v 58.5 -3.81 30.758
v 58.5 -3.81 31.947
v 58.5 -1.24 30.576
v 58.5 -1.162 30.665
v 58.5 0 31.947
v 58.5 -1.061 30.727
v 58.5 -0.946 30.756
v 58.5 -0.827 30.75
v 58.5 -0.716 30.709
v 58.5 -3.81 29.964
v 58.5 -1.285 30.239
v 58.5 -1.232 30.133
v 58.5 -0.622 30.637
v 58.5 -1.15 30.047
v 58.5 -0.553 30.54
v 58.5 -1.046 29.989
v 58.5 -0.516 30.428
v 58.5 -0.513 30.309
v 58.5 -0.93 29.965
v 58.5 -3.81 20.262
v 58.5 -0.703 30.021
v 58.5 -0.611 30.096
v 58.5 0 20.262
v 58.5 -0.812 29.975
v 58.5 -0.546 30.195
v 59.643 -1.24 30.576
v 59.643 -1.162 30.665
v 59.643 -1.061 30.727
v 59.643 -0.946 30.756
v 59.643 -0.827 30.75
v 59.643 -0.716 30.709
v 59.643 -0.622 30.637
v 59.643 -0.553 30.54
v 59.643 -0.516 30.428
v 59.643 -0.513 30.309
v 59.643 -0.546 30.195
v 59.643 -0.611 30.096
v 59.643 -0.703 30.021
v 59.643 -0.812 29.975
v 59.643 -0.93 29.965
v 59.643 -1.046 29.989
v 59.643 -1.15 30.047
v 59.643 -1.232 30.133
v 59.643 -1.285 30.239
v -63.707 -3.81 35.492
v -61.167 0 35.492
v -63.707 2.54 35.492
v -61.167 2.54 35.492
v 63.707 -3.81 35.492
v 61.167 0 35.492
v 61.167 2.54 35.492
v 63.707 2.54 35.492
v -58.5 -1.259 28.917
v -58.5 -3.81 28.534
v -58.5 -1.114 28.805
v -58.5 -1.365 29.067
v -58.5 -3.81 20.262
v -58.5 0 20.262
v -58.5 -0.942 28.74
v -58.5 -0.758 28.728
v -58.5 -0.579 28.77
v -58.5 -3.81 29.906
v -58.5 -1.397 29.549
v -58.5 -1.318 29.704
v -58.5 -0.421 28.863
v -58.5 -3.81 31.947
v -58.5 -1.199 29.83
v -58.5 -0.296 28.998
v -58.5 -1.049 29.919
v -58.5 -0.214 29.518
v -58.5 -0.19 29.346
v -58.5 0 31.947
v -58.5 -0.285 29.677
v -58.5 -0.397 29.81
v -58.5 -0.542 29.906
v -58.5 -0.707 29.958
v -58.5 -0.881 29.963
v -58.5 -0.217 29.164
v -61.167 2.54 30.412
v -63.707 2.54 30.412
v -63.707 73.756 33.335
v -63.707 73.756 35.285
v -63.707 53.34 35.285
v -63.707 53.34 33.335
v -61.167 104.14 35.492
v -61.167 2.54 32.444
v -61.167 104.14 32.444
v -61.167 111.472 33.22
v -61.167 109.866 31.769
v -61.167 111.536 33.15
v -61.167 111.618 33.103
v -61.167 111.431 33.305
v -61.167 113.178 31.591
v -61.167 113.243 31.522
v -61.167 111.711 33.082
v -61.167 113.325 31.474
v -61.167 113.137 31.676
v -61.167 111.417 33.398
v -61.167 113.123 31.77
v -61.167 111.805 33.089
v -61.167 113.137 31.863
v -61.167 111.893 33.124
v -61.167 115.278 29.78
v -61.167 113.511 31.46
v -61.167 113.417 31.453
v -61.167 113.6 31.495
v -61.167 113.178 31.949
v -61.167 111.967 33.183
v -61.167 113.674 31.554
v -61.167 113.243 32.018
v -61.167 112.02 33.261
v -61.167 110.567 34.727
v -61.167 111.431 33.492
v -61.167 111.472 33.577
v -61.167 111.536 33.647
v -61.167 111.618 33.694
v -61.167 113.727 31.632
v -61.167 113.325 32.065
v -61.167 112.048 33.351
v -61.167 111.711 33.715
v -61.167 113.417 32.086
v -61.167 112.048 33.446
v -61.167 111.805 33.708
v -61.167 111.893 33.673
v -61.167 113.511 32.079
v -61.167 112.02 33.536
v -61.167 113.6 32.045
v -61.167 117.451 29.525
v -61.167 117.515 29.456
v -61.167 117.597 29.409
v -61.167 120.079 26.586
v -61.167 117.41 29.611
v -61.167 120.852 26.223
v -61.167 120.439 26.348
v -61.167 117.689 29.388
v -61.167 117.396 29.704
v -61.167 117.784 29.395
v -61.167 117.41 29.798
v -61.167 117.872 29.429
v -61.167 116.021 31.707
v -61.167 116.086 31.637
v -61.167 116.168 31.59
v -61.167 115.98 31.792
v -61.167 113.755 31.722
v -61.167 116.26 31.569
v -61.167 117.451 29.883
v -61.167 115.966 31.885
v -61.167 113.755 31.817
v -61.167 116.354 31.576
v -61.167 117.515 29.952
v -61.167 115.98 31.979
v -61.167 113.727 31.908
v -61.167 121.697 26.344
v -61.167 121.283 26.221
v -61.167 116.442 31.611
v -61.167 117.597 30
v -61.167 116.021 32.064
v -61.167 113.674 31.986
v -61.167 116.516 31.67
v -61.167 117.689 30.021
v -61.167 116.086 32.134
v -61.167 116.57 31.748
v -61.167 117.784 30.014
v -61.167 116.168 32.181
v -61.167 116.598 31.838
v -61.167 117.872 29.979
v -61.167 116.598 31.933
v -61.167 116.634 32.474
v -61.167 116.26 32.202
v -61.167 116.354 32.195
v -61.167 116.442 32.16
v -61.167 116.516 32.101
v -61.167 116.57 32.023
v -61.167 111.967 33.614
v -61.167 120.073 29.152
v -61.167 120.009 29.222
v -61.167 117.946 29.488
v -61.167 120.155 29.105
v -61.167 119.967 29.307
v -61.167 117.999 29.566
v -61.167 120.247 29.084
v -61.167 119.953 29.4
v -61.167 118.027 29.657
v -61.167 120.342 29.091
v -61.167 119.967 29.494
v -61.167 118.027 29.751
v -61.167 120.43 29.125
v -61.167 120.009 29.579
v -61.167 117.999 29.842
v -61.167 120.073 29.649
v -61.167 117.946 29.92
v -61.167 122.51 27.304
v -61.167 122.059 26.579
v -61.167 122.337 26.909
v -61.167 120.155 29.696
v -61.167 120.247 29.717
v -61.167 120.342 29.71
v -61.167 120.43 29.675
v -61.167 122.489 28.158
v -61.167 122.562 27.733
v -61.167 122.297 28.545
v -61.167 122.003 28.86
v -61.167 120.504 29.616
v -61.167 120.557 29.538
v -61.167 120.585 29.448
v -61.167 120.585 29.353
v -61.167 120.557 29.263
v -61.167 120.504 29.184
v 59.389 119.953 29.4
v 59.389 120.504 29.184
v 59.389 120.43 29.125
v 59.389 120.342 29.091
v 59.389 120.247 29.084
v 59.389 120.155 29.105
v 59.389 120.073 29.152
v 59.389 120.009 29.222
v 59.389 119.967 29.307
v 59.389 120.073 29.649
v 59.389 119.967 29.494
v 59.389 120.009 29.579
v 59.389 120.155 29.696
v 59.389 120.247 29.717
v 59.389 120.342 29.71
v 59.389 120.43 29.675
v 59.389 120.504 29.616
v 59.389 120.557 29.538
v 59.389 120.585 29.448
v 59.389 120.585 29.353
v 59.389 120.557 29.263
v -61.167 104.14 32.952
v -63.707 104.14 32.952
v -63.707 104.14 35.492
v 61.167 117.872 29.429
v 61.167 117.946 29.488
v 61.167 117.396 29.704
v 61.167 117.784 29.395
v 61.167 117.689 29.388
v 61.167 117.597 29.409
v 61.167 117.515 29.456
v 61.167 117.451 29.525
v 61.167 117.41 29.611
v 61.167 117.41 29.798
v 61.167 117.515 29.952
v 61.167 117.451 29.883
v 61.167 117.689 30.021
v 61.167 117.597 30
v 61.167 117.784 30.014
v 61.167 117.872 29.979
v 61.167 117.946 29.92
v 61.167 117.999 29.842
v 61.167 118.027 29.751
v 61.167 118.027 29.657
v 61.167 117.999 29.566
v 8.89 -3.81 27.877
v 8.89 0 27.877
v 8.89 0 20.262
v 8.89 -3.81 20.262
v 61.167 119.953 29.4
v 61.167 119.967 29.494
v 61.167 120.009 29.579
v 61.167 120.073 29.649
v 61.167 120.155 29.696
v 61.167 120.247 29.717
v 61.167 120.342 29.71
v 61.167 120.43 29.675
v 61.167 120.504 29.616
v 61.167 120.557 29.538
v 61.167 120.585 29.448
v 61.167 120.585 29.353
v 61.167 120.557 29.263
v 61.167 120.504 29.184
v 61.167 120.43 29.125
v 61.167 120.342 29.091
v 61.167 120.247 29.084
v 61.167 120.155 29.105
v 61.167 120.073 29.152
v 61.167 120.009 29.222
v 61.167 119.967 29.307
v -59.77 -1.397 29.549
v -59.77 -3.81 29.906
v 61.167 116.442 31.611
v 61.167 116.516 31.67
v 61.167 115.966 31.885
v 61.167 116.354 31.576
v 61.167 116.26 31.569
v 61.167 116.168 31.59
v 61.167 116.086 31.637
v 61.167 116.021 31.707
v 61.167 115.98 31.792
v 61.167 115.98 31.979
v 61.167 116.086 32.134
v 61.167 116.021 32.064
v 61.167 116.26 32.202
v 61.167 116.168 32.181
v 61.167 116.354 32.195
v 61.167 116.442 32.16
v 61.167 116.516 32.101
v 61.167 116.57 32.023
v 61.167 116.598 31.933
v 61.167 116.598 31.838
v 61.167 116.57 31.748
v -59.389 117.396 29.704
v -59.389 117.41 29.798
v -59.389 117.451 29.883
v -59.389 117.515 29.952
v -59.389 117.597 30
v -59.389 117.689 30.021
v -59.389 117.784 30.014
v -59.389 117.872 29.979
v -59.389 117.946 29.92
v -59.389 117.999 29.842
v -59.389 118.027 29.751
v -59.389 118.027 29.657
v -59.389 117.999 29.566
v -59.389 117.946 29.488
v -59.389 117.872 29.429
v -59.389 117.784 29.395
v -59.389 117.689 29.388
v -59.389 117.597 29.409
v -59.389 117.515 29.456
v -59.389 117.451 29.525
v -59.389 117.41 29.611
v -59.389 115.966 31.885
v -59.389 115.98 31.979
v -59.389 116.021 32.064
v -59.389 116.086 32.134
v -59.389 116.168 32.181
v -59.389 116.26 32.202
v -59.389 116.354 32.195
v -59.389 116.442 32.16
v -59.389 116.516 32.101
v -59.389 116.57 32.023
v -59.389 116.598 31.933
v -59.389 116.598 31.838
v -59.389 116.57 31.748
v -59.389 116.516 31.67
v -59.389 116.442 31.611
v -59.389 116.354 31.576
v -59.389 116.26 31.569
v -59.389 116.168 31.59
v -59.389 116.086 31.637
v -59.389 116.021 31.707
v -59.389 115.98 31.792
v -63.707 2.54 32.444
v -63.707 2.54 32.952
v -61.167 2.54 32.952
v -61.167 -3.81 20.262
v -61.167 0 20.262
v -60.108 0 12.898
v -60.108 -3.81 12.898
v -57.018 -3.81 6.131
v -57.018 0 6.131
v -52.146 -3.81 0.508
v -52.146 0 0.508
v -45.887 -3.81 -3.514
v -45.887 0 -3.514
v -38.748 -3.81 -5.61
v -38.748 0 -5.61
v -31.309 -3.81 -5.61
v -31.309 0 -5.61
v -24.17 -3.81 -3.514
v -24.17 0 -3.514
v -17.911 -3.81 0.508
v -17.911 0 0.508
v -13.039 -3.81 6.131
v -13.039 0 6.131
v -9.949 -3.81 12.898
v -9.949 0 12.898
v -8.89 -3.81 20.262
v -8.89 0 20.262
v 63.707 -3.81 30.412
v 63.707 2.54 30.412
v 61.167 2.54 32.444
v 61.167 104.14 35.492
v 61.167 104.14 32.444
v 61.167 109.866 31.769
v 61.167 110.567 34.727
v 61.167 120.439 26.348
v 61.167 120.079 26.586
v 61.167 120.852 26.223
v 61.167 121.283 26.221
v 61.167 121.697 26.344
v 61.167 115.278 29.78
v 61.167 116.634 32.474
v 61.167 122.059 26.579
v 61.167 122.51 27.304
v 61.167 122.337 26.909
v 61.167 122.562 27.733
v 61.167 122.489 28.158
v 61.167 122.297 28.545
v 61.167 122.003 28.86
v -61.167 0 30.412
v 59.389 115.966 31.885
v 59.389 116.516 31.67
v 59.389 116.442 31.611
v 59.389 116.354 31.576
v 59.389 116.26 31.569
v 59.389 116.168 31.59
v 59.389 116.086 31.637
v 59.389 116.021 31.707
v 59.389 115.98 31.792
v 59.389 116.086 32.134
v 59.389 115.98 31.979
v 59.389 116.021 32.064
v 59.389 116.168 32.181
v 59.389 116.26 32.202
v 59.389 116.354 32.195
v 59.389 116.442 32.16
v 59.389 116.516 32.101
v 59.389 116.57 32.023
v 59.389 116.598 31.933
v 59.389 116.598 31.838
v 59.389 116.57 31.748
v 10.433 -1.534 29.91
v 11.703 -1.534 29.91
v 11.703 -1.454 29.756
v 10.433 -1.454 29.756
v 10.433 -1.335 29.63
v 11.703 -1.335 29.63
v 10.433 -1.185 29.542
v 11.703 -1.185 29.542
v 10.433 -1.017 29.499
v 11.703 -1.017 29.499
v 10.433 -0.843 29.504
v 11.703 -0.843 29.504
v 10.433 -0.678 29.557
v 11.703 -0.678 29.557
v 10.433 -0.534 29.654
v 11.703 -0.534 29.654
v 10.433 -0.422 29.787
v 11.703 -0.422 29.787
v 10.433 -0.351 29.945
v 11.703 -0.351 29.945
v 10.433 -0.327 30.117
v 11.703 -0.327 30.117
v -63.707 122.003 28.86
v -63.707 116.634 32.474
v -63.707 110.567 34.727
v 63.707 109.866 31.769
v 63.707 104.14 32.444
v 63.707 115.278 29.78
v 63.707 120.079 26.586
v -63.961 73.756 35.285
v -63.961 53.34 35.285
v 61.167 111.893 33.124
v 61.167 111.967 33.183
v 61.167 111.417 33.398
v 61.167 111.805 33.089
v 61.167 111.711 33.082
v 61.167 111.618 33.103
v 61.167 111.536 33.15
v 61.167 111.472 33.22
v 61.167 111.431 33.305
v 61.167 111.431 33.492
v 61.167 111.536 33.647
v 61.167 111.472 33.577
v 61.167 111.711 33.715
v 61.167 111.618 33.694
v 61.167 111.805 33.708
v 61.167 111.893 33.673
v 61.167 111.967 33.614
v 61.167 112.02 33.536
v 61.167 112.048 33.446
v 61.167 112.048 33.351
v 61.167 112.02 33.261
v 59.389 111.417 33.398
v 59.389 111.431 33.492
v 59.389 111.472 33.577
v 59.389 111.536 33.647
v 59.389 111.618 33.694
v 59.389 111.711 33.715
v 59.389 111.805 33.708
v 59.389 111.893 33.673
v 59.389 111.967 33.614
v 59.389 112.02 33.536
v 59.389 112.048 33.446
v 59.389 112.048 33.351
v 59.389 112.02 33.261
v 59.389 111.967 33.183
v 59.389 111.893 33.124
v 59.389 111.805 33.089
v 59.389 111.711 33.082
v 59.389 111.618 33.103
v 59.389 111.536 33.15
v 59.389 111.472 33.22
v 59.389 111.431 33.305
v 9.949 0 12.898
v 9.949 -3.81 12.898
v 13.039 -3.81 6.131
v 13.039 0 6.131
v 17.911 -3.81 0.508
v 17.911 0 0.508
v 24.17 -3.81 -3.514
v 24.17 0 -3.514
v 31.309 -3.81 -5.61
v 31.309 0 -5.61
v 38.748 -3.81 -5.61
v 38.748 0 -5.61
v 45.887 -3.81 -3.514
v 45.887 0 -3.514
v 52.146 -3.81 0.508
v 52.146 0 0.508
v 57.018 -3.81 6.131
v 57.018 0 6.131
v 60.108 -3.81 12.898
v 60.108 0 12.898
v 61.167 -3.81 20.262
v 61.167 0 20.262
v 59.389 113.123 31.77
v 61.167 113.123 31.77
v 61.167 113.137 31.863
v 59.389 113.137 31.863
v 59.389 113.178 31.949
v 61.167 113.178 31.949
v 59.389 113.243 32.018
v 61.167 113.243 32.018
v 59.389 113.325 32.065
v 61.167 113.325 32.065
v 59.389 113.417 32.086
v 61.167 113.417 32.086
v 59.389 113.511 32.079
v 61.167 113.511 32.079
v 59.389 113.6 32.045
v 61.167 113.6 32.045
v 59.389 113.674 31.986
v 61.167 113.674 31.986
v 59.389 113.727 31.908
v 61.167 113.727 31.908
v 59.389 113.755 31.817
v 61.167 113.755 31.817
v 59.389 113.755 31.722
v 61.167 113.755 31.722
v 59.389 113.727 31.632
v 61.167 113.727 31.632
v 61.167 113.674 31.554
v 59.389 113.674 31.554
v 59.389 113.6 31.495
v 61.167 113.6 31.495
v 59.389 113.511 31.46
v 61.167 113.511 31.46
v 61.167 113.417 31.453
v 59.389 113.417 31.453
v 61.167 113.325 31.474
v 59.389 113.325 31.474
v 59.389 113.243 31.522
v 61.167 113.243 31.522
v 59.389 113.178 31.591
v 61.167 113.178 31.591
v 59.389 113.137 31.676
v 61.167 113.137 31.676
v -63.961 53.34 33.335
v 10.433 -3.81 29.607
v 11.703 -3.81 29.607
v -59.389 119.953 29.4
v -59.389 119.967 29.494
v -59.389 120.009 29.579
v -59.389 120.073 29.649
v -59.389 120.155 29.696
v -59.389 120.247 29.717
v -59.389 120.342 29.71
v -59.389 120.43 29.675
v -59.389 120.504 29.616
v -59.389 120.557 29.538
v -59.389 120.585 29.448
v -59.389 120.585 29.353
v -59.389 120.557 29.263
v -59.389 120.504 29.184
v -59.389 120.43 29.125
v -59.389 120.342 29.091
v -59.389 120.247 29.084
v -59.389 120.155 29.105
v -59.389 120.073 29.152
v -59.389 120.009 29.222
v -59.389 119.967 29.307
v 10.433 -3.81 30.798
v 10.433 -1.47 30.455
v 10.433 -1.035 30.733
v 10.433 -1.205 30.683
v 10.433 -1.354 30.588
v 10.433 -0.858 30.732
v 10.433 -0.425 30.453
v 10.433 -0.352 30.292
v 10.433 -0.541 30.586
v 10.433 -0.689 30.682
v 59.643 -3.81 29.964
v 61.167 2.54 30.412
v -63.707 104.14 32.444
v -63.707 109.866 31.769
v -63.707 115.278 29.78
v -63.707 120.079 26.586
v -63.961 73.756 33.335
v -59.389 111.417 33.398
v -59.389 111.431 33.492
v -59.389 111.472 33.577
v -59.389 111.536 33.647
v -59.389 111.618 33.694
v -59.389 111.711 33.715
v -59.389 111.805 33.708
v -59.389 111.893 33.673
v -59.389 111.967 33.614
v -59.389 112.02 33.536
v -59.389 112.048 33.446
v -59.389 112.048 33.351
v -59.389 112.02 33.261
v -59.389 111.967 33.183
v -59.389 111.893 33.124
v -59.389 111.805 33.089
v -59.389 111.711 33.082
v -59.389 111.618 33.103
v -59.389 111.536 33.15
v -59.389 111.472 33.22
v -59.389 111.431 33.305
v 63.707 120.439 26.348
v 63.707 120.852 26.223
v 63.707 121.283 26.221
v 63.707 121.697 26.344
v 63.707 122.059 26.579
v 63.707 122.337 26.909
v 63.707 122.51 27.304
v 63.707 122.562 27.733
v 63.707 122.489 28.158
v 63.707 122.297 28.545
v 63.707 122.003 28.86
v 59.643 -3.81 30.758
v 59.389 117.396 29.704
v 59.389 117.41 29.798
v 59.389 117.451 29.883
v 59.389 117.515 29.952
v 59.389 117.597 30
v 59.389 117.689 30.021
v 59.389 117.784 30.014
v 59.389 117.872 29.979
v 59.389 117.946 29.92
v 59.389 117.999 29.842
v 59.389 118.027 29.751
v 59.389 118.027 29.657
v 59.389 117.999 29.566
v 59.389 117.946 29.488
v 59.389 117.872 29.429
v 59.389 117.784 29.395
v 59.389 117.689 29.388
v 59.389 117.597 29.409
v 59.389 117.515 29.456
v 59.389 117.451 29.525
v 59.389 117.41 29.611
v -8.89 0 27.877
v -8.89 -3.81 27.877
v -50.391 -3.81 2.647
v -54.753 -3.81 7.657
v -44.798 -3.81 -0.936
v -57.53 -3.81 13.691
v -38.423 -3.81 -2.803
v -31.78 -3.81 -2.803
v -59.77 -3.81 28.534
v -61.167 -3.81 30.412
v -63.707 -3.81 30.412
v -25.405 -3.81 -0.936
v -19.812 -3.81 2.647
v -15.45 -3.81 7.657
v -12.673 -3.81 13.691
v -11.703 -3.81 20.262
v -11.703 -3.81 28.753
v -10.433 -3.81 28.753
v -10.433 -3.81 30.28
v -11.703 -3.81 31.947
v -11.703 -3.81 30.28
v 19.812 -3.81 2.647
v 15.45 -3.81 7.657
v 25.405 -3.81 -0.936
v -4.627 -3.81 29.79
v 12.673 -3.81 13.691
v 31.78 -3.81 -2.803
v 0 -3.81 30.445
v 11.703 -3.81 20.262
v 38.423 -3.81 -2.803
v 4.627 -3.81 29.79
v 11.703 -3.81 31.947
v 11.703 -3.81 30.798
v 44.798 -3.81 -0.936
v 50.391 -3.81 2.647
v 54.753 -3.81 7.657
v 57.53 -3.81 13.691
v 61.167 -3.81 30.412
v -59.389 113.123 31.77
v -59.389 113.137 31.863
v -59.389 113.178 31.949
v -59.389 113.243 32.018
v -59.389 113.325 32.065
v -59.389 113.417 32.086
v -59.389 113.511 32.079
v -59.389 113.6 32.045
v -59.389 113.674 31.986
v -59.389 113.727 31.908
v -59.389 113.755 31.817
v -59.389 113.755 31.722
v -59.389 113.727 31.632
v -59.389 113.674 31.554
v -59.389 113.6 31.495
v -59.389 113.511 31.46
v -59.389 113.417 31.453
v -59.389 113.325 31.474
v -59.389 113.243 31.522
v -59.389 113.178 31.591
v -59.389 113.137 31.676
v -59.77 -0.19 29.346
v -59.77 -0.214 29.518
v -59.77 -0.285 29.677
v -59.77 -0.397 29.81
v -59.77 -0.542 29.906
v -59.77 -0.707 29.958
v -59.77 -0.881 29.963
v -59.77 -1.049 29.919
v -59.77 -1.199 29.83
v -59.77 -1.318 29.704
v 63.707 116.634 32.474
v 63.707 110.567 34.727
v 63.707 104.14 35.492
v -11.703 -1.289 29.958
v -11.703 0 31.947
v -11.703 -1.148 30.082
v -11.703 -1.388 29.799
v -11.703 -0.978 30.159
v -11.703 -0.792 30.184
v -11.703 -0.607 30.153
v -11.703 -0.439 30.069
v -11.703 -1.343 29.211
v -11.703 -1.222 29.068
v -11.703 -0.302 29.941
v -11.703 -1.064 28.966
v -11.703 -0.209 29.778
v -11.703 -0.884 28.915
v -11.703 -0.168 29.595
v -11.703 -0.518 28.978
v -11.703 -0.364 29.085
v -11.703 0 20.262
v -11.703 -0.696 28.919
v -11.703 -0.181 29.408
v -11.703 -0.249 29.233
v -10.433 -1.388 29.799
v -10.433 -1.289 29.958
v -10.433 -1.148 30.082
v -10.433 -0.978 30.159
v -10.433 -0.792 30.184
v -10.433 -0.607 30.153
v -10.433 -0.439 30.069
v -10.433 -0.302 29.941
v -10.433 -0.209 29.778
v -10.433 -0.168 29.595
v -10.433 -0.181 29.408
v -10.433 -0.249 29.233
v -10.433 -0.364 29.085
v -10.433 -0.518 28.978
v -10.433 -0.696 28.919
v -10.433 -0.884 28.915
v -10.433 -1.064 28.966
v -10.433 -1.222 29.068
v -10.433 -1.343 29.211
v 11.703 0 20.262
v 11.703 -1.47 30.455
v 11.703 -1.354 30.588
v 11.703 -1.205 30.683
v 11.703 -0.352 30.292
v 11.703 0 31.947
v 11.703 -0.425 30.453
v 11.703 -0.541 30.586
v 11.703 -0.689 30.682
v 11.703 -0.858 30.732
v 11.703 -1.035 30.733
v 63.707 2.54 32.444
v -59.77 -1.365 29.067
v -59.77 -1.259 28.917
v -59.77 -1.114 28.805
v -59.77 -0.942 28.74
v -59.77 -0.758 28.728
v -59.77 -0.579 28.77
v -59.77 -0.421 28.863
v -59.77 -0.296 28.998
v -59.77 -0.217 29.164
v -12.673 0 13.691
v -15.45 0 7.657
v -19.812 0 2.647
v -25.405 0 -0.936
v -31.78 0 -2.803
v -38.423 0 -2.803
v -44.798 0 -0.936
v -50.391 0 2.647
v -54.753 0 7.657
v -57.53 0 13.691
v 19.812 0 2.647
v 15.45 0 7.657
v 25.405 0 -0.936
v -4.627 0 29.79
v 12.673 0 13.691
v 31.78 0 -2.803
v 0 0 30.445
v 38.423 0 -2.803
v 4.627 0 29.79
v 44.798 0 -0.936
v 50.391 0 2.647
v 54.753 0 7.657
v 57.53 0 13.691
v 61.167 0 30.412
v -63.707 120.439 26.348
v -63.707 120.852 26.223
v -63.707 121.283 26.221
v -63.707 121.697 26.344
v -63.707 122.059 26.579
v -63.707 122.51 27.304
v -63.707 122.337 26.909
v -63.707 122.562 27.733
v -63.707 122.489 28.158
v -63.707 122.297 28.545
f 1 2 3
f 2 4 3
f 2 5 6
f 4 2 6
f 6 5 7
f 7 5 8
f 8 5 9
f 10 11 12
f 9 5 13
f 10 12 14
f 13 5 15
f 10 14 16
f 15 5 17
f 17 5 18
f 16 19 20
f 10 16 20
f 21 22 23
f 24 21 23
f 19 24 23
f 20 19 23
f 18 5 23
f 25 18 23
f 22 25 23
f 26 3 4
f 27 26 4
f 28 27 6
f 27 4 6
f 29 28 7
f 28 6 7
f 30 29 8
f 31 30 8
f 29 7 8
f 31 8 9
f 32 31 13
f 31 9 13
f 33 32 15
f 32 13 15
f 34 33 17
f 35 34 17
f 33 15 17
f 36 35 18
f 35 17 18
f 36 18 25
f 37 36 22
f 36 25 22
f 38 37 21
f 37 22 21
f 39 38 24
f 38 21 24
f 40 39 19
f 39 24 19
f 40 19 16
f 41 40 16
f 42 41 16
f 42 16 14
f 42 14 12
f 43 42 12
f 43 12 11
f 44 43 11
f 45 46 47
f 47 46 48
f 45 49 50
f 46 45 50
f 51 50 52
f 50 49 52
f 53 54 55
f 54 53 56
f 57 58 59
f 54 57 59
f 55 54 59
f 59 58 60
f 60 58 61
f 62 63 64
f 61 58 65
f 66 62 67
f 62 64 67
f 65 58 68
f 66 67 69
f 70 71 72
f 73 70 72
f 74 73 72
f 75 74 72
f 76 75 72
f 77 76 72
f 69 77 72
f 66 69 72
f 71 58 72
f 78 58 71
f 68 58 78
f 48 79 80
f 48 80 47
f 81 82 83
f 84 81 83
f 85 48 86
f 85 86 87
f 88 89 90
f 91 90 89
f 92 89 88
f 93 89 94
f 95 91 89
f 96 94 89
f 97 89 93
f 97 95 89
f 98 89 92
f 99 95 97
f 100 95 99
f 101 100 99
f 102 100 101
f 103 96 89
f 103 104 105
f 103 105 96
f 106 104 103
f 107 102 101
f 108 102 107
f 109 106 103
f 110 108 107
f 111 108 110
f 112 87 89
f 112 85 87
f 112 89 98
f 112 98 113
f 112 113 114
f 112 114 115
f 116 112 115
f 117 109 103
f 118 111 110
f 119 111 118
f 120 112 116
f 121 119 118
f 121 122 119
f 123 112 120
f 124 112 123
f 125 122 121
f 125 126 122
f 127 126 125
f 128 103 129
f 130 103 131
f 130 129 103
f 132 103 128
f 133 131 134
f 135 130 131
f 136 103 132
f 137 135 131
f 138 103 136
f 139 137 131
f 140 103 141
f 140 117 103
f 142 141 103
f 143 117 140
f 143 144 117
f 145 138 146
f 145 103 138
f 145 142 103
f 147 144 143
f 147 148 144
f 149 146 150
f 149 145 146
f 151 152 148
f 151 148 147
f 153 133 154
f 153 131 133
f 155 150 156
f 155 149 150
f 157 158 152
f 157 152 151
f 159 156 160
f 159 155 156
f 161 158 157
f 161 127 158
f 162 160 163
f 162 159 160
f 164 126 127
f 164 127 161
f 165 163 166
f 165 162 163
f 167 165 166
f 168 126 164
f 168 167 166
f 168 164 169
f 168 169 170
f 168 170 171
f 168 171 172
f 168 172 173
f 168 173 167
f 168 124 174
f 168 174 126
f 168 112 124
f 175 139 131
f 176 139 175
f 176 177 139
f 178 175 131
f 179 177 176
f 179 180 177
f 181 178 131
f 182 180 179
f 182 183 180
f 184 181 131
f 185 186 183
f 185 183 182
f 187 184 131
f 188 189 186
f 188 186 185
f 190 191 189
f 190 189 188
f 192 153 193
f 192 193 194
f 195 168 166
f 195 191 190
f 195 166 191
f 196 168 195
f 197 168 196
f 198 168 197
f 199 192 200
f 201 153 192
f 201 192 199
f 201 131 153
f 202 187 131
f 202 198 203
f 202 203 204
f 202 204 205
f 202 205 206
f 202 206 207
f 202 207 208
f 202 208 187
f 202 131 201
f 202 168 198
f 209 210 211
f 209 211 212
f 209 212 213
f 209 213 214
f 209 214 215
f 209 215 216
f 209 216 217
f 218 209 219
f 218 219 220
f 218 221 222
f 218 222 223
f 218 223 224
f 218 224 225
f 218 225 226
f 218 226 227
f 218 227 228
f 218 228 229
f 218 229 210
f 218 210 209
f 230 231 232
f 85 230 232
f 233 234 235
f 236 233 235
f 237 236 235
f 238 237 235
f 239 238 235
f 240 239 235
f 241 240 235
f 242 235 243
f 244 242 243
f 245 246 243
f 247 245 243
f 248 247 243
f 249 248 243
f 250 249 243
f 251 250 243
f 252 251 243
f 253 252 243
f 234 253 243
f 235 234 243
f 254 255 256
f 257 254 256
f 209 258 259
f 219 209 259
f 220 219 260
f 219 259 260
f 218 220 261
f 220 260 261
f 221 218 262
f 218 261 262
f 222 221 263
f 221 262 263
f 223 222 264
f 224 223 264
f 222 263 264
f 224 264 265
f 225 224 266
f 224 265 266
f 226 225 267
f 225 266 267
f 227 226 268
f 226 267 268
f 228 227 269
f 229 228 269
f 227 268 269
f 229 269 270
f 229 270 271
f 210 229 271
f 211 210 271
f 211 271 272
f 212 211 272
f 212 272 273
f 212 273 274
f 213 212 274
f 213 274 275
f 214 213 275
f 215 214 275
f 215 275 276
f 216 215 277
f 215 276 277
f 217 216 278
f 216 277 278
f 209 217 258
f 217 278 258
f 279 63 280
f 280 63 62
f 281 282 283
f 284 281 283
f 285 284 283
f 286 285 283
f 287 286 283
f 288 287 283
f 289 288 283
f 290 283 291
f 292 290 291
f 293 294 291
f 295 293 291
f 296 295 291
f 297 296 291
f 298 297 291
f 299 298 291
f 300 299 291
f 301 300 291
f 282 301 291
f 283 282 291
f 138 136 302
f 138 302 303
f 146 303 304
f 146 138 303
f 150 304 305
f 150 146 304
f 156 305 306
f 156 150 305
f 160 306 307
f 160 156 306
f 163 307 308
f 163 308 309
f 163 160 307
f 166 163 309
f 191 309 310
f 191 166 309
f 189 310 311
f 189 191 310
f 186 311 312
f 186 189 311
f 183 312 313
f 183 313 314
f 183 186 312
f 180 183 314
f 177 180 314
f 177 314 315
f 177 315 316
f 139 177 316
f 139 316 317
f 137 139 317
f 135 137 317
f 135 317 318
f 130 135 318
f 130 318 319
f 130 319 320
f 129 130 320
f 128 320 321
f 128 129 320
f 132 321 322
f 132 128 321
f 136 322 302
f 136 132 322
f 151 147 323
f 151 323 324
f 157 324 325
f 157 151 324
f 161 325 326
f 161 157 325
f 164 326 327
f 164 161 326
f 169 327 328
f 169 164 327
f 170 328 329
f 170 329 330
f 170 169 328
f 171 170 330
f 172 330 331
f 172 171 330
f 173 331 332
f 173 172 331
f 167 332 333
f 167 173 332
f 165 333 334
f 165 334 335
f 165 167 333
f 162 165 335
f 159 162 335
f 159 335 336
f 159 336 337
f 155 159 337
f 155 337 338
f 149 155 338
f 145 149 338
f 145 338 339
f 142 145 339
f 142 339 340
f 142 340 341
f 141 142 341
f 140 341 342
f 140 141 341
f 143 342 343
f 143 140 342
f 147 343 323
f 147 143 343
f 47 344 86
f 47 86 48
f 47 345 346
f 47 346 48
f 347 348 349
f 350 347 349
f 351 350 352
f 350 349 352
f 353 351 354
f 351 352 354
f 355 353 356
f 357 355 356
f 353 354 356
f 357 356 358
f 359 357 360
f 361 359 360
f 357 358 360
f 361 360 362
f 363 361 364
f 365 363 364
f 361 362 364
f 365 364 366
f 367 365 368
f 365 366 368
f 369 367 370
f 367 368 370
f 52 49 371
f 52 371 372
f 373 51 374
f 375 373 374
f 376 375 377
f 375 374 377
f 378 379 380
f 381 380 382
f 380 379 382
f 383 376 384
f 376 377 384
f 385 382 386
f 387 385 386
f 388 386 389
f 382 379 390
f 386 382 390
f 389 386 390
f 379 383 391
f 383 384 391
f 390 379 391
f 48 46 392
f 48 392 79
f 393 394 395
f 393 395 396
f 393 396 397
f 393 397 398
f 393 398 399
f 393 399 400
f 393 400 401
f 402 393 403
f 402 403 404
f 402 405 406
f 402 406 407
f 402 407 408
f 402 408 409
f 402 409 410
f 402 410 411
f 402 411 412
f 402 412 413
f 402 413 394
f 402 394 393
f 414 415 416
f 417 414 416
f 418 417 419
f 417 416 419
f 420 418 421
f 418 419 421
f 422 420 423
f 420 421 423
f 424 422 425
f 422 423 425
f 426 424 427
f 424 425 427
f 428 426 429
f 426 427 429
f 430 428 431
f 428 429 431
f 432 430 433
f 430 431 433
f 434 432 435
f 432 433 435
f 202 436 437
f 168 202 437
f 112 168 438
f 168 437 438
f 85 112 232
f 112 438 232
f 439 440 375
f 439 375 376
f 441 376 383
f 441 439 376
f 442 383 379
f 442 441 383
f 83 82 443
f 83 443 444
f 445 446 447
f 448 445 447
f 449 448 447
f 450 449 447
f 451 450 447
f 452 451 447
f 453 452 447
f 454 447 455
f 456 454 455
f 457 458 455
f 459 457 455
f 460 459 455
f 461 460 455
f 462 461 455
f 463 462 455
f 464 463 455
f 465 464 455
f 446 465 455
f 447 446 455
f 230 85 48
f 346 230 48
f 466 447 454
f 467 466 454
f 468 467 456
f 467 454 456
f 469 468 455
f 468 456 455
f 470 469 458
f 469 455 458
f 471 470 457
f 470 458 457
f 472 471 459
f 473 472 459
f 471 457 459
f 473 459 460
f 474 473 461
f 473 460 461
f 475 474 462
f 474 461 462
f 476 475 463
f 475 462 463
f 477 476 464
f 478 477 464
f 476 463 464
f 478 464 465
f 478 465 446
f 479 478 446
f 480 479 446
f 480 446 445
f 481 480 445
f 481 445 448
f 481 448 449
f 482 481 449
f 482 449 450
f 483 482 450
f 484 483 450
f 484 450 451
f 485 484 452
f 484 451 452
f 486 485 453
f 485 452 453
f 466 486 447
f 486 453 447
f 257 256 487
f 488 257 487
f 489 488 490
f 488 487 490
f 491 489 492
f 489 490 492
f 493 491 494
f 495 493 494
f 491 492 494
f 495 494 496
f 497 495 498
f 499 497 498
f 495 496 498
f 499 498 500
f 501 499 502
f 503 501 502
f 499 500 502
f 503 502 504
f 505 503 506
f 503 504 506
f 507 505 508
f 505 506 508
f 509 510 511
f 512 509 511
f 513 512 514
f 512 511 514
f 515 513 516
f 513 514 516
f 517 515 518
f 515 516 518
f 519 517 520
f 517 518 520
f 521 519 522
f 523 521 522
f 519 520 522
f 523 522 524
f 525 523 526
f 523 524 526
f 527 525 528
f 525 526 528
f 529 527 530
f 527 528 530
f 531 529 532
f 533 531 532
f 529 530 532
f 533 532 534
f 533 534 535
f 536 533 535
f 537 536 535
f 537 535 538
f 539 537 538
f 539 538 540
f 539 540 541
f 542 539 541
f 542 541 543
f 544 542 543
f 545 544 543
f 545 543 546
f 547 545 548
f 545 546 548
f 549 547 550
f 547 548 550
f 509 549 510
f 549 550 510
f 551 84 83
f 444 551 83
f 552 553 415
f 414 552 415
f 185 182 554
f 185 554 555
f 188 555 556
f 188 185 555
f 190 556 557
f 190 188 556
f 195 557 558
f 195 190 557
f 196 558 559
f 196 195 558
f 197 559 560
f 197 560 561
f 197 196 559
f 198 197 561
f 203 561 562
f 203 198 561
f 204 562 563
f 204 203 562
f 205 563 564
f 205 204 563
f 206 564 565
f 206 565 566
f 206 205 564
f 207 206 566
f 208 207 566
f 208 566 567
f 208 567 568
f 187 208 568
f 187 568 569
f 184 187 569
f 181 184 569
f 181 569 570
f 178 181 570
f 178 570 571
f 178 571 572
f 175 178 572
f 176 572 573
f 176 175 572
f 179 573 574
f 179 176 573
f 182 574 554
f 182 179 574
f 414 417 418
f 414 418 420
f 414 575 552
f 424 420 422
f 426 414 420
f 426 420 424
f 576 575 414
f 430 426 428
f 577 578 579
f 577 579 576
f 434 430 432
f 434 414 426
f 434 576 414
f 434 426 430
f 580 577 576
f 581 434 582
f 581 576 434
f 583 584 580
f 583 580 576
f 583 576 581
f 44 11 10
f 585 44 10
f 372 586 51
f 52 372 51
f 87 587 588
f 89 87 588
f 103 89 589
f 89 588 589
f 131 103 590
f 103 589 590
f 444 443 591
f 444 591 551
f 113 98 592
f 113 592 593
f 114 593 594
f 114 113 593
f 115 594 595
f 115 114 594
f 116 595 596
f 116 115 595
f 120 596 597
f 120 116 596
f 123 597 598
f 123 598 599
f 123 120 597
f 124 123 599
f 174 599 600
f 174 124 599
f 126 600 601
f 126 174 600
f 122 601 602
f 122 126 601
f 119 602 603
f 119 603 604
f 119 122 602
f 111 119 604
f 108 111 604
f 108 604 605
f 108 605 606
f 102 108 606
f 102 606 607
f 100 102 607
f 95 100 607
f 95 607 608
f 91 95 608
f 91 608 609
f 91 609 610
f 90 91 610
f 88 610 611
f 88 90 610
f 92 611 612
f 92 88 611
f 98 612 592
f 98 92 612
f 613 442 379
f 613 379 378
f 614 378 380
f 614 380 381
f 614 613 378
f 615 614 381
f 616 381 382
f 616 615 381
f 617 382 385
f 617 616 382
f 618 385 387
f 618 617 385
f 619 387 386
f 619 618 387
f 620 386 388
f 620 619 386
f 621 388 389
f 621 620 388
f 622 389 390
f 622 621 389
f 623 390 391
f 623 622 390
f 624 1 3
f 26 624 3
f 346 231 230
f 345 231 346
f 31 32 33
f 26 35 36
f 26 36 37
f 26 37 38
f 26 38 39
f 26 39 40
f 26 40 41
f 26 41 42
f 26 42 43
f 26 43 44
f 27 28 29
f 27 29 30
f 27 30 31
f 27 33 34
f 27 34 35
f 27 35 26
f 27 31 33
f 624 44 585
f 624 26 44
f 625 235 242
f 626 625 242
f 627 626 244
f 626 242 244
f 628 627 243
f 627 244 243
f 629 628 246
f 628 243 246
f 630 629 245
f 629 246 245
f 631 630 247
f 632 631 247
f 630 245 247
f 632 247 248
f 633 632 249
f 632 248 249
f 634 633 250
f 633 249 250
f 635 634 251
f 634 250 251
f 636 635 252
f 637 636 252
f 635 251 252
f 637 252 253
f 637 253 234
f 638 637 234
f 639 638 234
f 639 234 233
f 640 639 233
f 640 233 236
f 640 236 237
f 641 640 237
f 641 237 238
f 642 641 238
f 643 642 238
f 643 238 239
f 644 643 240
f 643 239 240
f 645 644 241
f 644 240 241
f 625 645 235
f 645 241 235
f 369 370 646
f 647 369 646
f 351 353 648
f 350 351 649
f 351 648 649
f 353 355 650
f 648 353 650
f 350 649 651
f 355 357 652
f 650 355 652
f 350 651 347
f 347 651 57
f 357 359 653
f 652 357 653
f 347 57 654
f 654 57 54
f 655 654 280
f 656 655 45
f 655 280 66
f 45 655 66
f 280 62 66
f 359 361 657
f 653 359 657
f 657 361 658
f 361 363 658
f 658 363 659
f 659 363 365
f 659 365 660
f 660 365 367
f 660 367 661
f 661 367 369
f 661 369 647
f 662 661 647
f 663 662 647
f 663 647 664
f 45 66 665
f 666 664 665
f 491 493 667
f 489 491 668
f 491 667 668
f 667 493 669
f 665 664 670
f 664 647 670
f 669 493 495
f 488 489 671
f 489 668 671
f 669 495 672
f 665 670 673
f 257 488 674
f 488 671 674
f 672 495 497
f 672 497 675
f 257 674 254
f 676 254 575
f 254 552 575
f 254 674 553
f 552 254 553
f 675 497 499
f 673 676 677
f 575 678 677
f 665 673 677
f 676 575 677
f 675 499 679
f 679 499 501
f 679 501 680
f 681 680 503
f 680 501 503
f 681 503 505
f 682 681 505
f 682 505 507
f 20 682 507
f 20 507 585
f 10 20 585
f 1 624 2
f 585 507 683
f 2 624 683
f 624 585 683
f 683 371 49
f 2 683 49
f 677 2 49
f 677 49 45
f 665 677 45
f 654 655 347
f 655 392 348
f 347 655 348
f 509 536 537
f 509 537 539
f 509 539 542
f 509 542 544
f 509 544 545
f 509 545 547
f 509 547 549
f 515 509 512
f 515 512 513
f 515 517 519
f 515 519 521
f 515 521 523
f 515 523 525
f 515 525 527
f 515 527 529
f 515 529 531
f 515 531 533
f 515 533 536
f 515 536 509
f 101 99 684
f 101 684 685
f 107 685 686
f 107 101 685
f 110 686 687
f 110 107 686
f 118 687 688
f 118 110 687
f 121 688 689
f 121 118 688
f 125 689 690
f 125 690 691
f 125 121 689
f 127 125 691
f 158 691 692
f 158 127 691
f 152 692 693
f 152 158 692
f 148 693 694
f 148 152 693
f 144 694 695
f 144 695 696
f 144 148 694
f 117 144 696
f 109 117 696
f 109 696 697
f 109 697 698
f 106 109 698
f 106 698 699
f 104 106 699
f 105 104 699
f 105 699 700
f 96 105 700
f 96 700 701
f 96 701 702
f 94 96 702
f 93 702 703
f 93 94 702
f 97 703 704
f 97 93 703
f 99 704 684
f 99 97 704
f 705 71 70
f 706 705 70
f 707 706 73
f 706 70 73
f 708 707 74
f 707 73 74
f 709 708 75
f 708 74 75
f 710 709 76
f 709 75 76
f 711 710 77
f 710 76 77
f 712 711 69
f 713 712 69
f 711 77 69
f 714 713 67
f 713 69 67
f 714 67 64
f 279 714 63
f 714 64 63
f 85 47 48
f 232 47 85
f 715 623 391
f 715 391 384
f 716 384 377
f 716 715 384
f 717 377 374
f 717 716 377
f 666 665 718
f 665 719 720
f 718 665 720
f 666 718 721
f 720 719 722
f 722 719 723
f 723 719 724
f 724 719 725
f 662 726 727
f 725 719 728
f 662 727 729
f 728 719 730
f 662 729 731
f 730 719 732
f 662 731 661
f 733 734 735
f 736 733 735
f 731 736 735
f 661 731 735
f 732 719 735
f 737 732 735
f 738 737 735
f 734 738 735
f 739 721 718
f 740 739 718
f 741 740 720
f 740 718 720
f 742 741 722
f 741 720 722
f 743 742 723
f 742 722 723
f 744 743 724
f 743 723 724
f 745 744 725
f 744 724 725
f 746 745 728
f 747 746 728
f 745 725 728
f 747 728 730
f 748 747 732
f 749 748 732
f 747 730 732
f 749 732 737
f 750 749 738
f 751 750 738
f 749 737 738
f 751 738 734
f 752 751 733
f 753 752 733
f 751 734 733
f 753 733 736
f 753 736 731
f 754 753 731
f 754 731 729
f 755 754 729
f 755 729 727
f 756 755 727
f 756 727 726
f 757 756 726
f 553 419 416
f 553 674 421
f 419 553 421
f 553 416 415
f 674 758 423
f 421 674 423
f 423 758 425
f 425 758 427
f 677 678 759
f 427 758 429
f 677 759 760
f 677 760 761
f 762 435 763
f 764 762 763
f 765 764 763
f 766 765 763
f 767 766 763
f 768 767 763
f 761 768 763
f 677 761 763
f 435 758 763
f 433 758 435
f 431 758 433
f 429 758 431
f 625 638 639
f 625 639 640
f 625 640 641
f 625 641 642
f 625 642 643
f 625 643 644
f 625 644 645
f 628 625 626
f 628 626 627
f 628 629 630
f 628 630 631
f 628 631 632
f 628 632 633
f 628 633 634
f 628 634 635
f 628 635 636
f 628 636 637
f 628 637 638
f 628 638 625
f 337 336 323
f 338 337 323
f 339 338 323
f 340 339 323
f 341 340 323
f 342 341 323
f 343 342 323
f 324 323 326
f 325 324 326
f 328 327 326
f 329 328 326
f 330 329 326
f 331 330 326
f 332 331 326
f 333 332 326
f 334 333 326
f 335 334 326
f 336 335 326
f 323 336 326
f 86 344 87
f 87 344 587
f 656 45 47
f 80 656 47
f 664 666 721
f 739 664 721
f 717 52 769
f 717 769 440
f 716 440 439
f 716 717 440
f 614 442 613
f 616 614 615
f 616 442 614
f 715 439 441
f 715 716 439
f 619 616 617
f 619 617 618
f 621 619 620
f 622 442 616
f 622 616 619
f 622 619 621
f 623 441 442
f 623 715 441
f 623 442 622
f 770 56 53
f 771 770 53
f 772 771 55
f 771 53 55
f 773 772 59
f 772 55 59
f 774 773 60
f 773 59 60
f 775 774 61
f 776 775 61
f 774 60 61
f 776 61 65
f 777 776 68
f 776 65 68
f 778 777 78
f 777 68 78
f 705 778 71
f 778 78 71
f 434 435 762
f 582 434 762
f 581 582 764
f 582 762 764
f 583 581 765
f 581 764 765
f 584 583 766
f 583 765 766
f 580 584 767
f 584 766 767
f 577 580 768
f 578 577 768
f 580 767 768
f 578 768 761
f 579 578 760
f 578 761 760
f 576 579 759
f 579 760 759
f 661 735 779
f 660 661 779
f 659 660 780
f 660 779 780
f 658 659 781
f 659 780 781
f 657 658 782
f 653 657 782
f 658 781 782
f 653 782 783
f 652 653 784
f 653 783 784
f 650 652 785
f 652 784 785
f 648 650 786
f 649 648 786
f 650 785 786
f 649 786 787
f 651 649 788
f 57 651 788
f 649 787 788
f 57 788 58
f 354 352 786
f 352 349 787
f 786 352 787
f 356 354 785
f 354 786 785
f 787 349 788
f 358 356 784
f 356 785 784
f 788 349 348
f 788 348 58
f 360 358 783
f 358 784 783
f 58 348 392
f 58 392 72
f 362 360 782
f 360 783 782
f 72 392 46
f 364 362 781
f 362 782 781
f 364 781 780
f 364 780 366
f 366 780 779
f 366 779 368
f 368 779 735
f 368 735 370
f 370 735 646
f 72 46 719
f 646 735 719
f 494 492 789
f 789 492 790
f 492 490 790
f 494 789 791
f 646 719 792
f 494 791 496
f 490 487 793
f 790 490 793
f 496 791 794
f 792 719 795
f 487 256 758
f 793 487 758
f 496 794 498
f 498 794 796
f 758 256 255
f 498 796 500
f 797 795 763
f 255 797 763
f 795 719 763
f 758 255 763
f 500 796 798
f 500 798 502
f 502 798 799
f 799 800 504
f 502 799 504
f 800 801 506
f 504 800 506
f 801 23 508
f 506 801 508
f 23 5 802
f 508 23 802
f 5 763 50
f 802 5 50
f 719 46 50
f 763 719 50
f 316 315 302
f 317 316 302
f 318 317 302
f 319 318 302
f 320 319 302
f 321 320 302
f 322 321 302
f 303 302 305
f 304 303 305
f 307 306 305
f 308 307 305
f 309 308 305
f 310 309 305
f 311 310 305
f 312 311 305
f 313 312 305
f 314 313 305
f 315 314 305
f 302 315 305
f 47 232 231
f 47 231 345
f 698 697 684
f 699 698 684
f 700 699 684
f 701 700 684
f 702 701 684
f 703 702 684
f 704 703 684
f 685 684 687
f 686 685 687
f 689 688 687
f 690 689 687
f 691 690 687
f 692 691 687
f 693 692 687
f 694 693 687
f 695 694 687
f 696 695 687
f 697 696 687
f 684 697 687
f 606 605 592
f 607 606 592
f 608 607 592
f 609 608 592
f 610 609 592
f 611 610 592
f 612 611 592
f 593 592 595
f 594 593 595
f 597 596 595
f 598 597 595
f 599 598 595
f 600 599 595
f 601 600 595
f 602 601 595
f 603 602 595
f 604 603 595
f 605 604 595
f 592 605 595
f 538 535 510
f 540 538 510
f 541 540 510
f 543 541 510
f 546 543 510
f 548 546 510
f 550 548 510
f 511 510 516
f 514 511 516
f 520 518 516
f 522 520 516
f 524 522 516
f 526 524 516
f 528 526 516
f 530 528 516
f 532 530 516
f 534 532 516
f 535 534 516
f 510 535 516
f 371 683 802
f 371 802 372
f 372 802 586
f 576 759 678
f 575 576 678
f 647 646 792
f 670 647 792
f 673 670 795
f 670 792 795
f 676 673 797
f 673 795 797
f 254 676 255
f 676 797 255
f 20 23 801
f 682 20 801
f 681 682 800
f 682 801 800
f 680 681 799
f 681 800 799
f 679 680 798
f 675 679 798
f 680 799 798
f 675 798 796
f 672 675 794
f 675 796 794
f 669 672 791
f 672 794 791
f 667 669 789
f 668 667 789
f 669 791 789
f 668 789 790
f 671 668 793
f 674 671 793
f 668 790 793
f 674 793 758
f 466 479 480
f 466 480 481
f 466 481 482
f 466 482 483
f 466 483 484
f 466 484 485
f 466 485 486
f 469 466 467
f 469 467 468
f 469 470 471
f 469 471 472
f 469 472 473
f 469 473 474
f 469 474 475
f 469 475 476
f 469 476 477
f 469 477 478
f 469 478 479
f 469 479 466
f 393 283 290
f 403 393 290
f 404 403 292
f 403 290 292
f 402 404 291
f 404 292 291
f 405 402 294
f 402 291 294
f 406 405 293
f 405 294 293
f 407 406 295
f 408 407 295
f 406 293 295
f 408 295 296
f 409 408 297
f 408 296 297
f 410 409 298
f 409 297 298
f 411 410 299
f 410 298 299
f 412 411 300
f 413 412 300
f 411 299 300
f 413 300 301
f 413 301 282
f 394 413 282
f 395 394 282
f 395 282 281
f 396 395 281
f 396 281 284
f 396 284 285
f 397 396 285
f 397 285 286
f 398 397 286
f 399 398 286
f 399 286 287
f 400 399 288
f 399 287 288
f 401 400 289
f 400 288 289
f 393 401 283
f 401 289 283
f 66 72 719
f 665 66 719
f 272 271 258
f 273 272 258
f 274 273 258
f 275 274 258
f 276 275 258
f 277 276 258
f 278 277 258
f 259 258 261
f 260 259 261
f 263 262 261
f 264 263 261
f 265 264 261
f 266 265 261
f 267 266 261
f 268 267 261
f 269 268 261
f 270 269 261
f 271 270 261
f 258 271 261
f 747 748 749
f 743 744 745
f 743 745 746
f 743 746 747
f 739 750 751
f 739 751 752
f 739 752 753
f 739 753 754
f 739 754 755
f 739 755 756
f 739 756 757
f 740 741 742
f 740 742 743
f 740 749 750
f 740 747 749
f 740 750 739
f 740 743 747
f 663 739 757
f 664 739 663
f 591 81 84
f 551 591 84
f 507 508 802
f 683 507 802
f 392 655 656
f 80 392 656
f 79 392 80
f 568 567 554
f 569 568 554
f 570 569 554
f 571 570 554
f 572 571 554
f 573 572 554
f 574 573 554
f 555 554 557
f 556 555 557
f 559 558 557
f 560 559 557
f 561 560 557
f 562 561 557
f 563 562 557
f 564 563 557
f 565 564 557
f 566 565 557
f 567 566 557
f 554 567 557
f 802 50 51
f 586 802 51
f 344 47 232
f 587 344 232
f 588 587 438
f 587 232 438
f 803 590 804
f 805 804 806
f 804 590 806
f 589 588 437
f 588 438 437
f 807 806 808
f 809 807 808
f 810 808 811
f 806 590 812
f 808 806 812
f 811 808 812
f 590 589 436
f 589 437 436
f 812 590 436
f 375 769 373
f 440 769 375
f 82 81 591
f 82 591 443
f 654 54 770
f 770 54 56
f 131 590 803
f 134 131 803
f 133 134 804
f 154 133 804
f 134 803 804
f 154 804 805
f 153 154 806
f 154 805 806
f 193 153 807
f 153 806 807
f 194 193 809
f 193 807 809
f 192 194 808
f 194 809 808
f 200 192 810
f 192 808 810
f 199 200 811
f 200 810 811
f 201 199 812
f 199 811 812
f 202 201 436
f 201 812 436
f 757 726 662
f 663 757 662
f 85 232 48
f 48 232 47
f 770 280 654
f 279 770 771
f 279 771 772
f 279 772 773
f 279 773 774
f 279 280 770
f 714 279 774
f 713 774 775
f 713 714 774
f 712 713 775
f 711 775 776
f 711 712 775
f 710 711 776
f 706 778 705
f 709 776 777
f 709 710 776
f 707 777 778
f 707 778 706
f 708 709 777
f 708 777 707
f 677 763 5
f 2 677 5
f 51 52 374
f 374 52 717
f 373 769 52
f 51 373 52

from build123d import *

# Parameters (mm, degrees)
F1_DEPTH  = 3.81
F2_W      = 6.35
F2_H      = 5.08
F3_DEPTH  = 2.54
F5_W      = 101.6
F5_H      = 3.048
F6_DEPTH  = 2.54
F7_W      = 101.6
F7_H      = 2.54
F8_DEPTH  = 2.54
F9_W      = 20.4162850118
F9_H      = 1.9500367343
F10_DEPTH = 0.254
F12_DEPTH = 2.54
F14_R     = 0.3175
F15_DEPTH = 1.778
F18_DEPTH = 1.143
F20_DEPTH = 1.27
F22_DEPTH = 1.27
F24_DEPTH = 1.27


with BuildPart() as f1:
    # F0 (on Front) → F1 (new body)
    with BuildSketch(Plane.XZ):
        with BuildLine():
            Line((8.89, 35.491819303), (0, 35.491819303))
            Line((0, 35.491819303), (-8.89, 35.491819303))
            Line((-8.89, 35.491819303), (-8.89, 27.8771001825))
            ThreePointArc((-8.89, 27.8771001825), (0, 30.4448411771), (8.89, 27.8771001825))
            Line((8.89, 27.8771001825), (8.89, 35.491819303))
        make_face()
        with BuildLine():
            Line((-8.89, 27.8771001825), (-8.89, 35.491819303))
            Line((-8.89, 35.491819303), (-61.167026878, 35.491819303))
            Line((-61.167026878, 35.491819303), (-61.167026878, 20.2623810619))
            ThreePointArc((-61.167026878, 20.2623810619), (-35.028513439, -5.8761323771), (-8.89, 20.2623810619))
            Line((-8.89, 20.2623810619), (-8.89, 27.8771001825))
        make_face()
        with BuildLine():
            ThreePointArc((-11.7025515065, 20.2623810619), (-35.1013853215, -3.0397615448), (-58.5002191365, 20.2623810619))
            Line((-58.5002191365, 20.2623810619), (-58.5002191365, 31.9472067058))
            Line((-58.5002191365, 31.9472067058), (-11.7025515065, 31.9472067058))
            Line((-11.7025515065, 31.9472067058), (-11.7025515065, 20.2623810619))
        make_face(mode=Mode.SUBTRACT)
        with BuildLine():
            Line((61.167026878, 35.491819303), (8.89, 35.491819303))
            Line((8.89, 35.491819303), (8.89, 27.8771001825))
            Line((8.89, 27.8771001825), (8.89, 20.2623810619))
            ThreePointArc((8.89, 20.2623810619), (35.028513439, -5.8761323771), (61.167026878, 20.2623810619))
            Line((61.167026878, 20.2623810619), (61.167026878, 35.491819303))
        make_face()
        with BuildLine():
            Line((11.7025515065, 31.9472067058), (58.5002191365, 31.9472067058))
            Line((58.5002191365, 31.9472067058), (58.5002191365, 20.2623810619))
            ThreePointArc((58.5002191365, 20.2623810619), (35.1013853215, -3.0397615448), (11.7025515065, 20.2623810619))
            Line((11.7025515065, 20.2623810619), (11.7025515065, 31.9472067058))
        make_face(mode=Mode.SUBTRACT)
    extrude(amount=F1_DEPTH)

    # F2 (on face) → F3 (join)
    with BuildSketch(Plane.YZ.offset(61.167026878)):
        with Locations((-0.635, 32.951819303)):
            Rectangle(F2_W, F2_H)
    extrude(amount=F3_DEPTH)

    # F4: F1 across plane


with BuildPart() as f1_1:
    add(f1.part)
    add(f1.part.mirror(Plane.YZ))

    # F17 (on face) → F18 (cut)
    with BuildSketch(Plane(origin=(58.5002191365, 0, 0), x_dir=(0, -1, 0), z_dir=(-1, 0, 0))):
        with BuildLine():
            ThreePointArc((1.2845198591, 30.239206098), (1.2988156365, 30.2992732373), (1.303619671, 30.3608309478))
            ThreePointArc((1.303619671, 30.3608309478), (1.2874340011, 30.4730040235), (1.2401974525, 30.5760257848))
            ThreePointArc((1.2401974525, 30.5760257848), (0.5134218421, 30.3090626702), (1.2845198591, 30.239206098))
        make_face()
        with BuildLine():
            ThreePointArc((1.2401974525, 30.5760257848), (1.2874340011, 30.4730040235), (1.303619671, 30.3608309478))
            ThreePointArc((1.303619671, 30.3608309478), (1.2988156365, 30.2992732373), (1.2845198591, 30.239206098))
            Line((1.2845198591, 30.239206098), (3.81, 29.9640362842))
            Line((3.81, 29.9640362842), (3.81, 30.7576256113))
            Line((3.81, 30.7576256113), (1.2401974525, 30.5760257848))
        make_face()
    extrude(amount=-F18_DEPTH, mode=Mode.SUBTRACT)

    # F19 (on face) → F20 (cut)
    with BuildSketch(Plane.YZ.offset(11.7025515065)):
        with BuildLine():
            ThreePointArc((-1.5344448459, 29.9096479588), (-0.843178998, 29.5043172702), (-0.3267133253, 30.1170200109))
            ThreePointArc((-0.3267133253, 30.1170200109), (-0.771947349, 30.7131266136), (-1.469903859, 30.455380367))
            ThreePointArc((-1.469903859, 30.455380367), (-1.5657489749, 30.1900328091), (-1.5344448459, 29.9096479588))
        make_face()
        with BuildLine():
            ThreePointArc((-1.5344448459, 29.9096479588), (-1.5657489749, 30.1900328091), (-1.469903859, 30.455380367))
            Line((-1.469903859, 30.455380367), (-3.81, 30.7979229838))
            Line((-3.81, 30.7979229838), (-3.81, 29.607038945))
            Line((-3.81, 29.607038945), (-1.5344448459, 29.9096479588))
        make_face()
    extrude(amount=-F20_DEPTH, mode=Mode.SUBTRACT)

    # F21 (on face) → F22 (cut)
    with BuildSketch(Plane.YZ.offset(-58.5002191365)):
        with BuildLine():
            ThreePointArc((-1.3648844893, 29.0673966875), (-0.6670225121, 28.7422296785), (-0.189563217, 29.3461978436))
            ThreePointArc((-0.189563217, 29.3461978436), (-0.707470296, 29.9583508822), (-1.3969558464, 29.5489992474))
            ThreePointArc((-1.3969558464, 29.5489992474), (-1.4296478817, 29.304953043), (-1.3648844893, 29.0673966875))
        make_face()
        with BuildLine():
            ThreePointArc((-1.3648844893, 29.0673966875), (-1.4296478817, 29.304953043), (-1.3969558464, 29.5489992474))
            Line((-1.3969558464, 29.5489992474), (-3.81, 29.9056489021))
            Line((-3.81, 29.9056489021), (-3.81, 28.5336878151))
            Line((-3.81, 28.5336878151), (-1.3648844893, 29.0673966875))
        make_face()
    extrude(amount=-F22_DEPTH, mode=Mode.SUBTRACT)

    # F23 (on face) → F24 (cut)
    with BuildSketch(Plane(origin=(-11.7025515065, 0, 0), x_dir=(0, -1, 0), z_dir=(-1, 0, 0))):
        with BuildLine():
            ThreePointArc((1.3434285805, 29.2105876086), (1.4150944565, 29.3721062282), (1.4396124445, 29.5471008867))
            ThreePointArc((1.4396124445, 29.5471008867), (1.4265256847, 29.6755339351), (1.3878033244, 29.7986878633))
            ThreePointArc((1.3878033244, 29.7986878633), (0.1678927477, 29.5950112055), (1.3434285805, 29.2105876086))
        make_face()
        with BuildLine():
            ThreePointArc((1.3878033244, 29.7986878633), (1.4265256847, 29.6755339351), (1.4396124445, 29.5471008867))
            ThreePointArc((1.4396124445, 29.5471008867), (1.4150944565, 29.3721062282), (1.3434285805, 29.2105876086))
            Line((1.3434285805, 29.2105876086), (3.81, 28.7525691092))
            Line((3.81, 28.7525691092), (3.81, 30.2800890058))
            Line((3.81, 30.2800890058), (1.3878033244, 29.7986878633))
        make_face()
    extrude(amount=-F24_DEPTH, mode=Mode.SUBTRACT)


with BuildPart() as f6:
    # F5 (on face) → F6 (new body)
    with BuildSketch(Plane.YZ.offset(63.707026878)):
        with Locations((53.34, 33.967819303)):
            Rectangle(F5_W, F5_H)
    extrude(amount=-F6_DEPTH)

    # F11 (on face) → F12 (join)
    with BuildSketch(Plane.YZ.offset(63.707026878)):
        with BuildLine():
            ThreePointArc((104.14, 32.443819303), (112.6305060514, 30.9330988595), (120.0787946582, 26.5863798559))
            ThreePointArc((120.0787946582, 26.5863798559), (122.210042136, 26.7338822785), (122.0027580857, 28.8601480424))
            ThreePointArc((122.0027580857, 28.8601480424), (113.667029838, 33.780400665), (104.14, 35.491819303))
            Line((104.14, 35.491819303), (104.14, 32.443819303))
        make_face()
    extrude(amount=-F12_DEPTH)


with BuildPart() as f8:
    # F7 (on face) → F8 (new body)
    with BuildSketch(Plane(origin=(-63.707026878, 0, 0), x_dir=(0, -1, 0), z_dir=(-1, 0, 0))):
        with Locations((-53.34, 34.221819303)):
            Rectangle(F7_W, F7_H)
    extrude(amount=-F8_DEPTH)


with BuildPart() as f10:
    # F9 (on face) → F10 (new body)
    with BuildSketch(Plane(origin=(-63.707026878, 0, 0), x_dir=(0, -1, 0), z_dir=(-1, 0, 0))):
        with Locations((-63.5481425059, 34.3102347106)):
            Rectangle(F9_W, F9_H)
    extrude(amount=F10_DEPTH)


with BuildPart() as f13_1:
    # F13: instance of F6
    add(f6.part.mirror(Plane.YZ))

    # F16: F15d, F15e, F15b, F15, F15c across plane


with BuildPart() as f15:
    # F14 (on face) → F15 (new body)
    with BuildSketch(Plane(origin=(61.167026878, 0, 0), x_dir=(0, -1, 0), z_dir=(-1, 0, 0))):
        with Locations((-120.2708929777, 29.4003784657)):
            Circle(F14_R)
    extrude(amount=F15_DEPTH)


with BuildPart() as f15b:
    # F14 (on face) → F15, piece 2 (new body)
    with BuildSketch(Plane(origin=(61.167026878, 0, 0), x_dir=(0, -1, 0), z_dir=(-1, 0, 0))):
        with Locations((-117.7130416036, 29.7041404992)):
            Circle(F14_R)
    extrude(amount=F15_DEPTH)


with BuildPart() as f15c:
    # F14 (on face) → F15, piece 3 (new body)
    with BuildSketch(Plane(origin=(61.167026878, 0, 0), x_dir=(0, -1, 0), z_dir=(-1, 0, 0))):
        with Locations((-116.2837222219, 31.8854898214)):
            Circle(F14_R)
    extrude(amount=F15_DEPTH)


with BuildPart() as f15d:
    # F14 (on face) → F15, piece 4 (new body)
    with BuildSketch(Plane(origin=(61.167026878, 0, 0), x_dir=(0, -1, 0), z_dir=(-1, 0, 0))):
        with Locations((-113.4407967329, 31.7698046565)):
            Circle(F14_R)
    extrude(amount=F15_DEPTH)


with BuildPart() as f15e:
    # F14 (on face) → F15, piece 5 (new body)
    with BuildSketch(Plane(origin=(61.167026878, 0, 0), x_dir=(0, -1, 0), z_dir=(-1, 0, 0))):
        with Locations((-111.7342412472, 33.3984978497)):
            Circle(F14_R)
    extrude(amount=F15_DEPTH)


with BuildPart() as f13_1_1:
    add(f13_1.part)
    add(f15d.part.mirror(Plane.YZ))
    add(f15e.part.mirror(Plane.YZ))
    add(f15b.part.mirror(Plane.YZ))
    add(f15.part.mirror(Plane.YZ))
    add(f15c.part.mirror(Plane.YZ))


solid = Compound([f1_1.part, f6.part, f8.part, f10.part, f15.part, f15b.part, f15c.part, f15d.part, f15e.part, f13_1_1.part])
